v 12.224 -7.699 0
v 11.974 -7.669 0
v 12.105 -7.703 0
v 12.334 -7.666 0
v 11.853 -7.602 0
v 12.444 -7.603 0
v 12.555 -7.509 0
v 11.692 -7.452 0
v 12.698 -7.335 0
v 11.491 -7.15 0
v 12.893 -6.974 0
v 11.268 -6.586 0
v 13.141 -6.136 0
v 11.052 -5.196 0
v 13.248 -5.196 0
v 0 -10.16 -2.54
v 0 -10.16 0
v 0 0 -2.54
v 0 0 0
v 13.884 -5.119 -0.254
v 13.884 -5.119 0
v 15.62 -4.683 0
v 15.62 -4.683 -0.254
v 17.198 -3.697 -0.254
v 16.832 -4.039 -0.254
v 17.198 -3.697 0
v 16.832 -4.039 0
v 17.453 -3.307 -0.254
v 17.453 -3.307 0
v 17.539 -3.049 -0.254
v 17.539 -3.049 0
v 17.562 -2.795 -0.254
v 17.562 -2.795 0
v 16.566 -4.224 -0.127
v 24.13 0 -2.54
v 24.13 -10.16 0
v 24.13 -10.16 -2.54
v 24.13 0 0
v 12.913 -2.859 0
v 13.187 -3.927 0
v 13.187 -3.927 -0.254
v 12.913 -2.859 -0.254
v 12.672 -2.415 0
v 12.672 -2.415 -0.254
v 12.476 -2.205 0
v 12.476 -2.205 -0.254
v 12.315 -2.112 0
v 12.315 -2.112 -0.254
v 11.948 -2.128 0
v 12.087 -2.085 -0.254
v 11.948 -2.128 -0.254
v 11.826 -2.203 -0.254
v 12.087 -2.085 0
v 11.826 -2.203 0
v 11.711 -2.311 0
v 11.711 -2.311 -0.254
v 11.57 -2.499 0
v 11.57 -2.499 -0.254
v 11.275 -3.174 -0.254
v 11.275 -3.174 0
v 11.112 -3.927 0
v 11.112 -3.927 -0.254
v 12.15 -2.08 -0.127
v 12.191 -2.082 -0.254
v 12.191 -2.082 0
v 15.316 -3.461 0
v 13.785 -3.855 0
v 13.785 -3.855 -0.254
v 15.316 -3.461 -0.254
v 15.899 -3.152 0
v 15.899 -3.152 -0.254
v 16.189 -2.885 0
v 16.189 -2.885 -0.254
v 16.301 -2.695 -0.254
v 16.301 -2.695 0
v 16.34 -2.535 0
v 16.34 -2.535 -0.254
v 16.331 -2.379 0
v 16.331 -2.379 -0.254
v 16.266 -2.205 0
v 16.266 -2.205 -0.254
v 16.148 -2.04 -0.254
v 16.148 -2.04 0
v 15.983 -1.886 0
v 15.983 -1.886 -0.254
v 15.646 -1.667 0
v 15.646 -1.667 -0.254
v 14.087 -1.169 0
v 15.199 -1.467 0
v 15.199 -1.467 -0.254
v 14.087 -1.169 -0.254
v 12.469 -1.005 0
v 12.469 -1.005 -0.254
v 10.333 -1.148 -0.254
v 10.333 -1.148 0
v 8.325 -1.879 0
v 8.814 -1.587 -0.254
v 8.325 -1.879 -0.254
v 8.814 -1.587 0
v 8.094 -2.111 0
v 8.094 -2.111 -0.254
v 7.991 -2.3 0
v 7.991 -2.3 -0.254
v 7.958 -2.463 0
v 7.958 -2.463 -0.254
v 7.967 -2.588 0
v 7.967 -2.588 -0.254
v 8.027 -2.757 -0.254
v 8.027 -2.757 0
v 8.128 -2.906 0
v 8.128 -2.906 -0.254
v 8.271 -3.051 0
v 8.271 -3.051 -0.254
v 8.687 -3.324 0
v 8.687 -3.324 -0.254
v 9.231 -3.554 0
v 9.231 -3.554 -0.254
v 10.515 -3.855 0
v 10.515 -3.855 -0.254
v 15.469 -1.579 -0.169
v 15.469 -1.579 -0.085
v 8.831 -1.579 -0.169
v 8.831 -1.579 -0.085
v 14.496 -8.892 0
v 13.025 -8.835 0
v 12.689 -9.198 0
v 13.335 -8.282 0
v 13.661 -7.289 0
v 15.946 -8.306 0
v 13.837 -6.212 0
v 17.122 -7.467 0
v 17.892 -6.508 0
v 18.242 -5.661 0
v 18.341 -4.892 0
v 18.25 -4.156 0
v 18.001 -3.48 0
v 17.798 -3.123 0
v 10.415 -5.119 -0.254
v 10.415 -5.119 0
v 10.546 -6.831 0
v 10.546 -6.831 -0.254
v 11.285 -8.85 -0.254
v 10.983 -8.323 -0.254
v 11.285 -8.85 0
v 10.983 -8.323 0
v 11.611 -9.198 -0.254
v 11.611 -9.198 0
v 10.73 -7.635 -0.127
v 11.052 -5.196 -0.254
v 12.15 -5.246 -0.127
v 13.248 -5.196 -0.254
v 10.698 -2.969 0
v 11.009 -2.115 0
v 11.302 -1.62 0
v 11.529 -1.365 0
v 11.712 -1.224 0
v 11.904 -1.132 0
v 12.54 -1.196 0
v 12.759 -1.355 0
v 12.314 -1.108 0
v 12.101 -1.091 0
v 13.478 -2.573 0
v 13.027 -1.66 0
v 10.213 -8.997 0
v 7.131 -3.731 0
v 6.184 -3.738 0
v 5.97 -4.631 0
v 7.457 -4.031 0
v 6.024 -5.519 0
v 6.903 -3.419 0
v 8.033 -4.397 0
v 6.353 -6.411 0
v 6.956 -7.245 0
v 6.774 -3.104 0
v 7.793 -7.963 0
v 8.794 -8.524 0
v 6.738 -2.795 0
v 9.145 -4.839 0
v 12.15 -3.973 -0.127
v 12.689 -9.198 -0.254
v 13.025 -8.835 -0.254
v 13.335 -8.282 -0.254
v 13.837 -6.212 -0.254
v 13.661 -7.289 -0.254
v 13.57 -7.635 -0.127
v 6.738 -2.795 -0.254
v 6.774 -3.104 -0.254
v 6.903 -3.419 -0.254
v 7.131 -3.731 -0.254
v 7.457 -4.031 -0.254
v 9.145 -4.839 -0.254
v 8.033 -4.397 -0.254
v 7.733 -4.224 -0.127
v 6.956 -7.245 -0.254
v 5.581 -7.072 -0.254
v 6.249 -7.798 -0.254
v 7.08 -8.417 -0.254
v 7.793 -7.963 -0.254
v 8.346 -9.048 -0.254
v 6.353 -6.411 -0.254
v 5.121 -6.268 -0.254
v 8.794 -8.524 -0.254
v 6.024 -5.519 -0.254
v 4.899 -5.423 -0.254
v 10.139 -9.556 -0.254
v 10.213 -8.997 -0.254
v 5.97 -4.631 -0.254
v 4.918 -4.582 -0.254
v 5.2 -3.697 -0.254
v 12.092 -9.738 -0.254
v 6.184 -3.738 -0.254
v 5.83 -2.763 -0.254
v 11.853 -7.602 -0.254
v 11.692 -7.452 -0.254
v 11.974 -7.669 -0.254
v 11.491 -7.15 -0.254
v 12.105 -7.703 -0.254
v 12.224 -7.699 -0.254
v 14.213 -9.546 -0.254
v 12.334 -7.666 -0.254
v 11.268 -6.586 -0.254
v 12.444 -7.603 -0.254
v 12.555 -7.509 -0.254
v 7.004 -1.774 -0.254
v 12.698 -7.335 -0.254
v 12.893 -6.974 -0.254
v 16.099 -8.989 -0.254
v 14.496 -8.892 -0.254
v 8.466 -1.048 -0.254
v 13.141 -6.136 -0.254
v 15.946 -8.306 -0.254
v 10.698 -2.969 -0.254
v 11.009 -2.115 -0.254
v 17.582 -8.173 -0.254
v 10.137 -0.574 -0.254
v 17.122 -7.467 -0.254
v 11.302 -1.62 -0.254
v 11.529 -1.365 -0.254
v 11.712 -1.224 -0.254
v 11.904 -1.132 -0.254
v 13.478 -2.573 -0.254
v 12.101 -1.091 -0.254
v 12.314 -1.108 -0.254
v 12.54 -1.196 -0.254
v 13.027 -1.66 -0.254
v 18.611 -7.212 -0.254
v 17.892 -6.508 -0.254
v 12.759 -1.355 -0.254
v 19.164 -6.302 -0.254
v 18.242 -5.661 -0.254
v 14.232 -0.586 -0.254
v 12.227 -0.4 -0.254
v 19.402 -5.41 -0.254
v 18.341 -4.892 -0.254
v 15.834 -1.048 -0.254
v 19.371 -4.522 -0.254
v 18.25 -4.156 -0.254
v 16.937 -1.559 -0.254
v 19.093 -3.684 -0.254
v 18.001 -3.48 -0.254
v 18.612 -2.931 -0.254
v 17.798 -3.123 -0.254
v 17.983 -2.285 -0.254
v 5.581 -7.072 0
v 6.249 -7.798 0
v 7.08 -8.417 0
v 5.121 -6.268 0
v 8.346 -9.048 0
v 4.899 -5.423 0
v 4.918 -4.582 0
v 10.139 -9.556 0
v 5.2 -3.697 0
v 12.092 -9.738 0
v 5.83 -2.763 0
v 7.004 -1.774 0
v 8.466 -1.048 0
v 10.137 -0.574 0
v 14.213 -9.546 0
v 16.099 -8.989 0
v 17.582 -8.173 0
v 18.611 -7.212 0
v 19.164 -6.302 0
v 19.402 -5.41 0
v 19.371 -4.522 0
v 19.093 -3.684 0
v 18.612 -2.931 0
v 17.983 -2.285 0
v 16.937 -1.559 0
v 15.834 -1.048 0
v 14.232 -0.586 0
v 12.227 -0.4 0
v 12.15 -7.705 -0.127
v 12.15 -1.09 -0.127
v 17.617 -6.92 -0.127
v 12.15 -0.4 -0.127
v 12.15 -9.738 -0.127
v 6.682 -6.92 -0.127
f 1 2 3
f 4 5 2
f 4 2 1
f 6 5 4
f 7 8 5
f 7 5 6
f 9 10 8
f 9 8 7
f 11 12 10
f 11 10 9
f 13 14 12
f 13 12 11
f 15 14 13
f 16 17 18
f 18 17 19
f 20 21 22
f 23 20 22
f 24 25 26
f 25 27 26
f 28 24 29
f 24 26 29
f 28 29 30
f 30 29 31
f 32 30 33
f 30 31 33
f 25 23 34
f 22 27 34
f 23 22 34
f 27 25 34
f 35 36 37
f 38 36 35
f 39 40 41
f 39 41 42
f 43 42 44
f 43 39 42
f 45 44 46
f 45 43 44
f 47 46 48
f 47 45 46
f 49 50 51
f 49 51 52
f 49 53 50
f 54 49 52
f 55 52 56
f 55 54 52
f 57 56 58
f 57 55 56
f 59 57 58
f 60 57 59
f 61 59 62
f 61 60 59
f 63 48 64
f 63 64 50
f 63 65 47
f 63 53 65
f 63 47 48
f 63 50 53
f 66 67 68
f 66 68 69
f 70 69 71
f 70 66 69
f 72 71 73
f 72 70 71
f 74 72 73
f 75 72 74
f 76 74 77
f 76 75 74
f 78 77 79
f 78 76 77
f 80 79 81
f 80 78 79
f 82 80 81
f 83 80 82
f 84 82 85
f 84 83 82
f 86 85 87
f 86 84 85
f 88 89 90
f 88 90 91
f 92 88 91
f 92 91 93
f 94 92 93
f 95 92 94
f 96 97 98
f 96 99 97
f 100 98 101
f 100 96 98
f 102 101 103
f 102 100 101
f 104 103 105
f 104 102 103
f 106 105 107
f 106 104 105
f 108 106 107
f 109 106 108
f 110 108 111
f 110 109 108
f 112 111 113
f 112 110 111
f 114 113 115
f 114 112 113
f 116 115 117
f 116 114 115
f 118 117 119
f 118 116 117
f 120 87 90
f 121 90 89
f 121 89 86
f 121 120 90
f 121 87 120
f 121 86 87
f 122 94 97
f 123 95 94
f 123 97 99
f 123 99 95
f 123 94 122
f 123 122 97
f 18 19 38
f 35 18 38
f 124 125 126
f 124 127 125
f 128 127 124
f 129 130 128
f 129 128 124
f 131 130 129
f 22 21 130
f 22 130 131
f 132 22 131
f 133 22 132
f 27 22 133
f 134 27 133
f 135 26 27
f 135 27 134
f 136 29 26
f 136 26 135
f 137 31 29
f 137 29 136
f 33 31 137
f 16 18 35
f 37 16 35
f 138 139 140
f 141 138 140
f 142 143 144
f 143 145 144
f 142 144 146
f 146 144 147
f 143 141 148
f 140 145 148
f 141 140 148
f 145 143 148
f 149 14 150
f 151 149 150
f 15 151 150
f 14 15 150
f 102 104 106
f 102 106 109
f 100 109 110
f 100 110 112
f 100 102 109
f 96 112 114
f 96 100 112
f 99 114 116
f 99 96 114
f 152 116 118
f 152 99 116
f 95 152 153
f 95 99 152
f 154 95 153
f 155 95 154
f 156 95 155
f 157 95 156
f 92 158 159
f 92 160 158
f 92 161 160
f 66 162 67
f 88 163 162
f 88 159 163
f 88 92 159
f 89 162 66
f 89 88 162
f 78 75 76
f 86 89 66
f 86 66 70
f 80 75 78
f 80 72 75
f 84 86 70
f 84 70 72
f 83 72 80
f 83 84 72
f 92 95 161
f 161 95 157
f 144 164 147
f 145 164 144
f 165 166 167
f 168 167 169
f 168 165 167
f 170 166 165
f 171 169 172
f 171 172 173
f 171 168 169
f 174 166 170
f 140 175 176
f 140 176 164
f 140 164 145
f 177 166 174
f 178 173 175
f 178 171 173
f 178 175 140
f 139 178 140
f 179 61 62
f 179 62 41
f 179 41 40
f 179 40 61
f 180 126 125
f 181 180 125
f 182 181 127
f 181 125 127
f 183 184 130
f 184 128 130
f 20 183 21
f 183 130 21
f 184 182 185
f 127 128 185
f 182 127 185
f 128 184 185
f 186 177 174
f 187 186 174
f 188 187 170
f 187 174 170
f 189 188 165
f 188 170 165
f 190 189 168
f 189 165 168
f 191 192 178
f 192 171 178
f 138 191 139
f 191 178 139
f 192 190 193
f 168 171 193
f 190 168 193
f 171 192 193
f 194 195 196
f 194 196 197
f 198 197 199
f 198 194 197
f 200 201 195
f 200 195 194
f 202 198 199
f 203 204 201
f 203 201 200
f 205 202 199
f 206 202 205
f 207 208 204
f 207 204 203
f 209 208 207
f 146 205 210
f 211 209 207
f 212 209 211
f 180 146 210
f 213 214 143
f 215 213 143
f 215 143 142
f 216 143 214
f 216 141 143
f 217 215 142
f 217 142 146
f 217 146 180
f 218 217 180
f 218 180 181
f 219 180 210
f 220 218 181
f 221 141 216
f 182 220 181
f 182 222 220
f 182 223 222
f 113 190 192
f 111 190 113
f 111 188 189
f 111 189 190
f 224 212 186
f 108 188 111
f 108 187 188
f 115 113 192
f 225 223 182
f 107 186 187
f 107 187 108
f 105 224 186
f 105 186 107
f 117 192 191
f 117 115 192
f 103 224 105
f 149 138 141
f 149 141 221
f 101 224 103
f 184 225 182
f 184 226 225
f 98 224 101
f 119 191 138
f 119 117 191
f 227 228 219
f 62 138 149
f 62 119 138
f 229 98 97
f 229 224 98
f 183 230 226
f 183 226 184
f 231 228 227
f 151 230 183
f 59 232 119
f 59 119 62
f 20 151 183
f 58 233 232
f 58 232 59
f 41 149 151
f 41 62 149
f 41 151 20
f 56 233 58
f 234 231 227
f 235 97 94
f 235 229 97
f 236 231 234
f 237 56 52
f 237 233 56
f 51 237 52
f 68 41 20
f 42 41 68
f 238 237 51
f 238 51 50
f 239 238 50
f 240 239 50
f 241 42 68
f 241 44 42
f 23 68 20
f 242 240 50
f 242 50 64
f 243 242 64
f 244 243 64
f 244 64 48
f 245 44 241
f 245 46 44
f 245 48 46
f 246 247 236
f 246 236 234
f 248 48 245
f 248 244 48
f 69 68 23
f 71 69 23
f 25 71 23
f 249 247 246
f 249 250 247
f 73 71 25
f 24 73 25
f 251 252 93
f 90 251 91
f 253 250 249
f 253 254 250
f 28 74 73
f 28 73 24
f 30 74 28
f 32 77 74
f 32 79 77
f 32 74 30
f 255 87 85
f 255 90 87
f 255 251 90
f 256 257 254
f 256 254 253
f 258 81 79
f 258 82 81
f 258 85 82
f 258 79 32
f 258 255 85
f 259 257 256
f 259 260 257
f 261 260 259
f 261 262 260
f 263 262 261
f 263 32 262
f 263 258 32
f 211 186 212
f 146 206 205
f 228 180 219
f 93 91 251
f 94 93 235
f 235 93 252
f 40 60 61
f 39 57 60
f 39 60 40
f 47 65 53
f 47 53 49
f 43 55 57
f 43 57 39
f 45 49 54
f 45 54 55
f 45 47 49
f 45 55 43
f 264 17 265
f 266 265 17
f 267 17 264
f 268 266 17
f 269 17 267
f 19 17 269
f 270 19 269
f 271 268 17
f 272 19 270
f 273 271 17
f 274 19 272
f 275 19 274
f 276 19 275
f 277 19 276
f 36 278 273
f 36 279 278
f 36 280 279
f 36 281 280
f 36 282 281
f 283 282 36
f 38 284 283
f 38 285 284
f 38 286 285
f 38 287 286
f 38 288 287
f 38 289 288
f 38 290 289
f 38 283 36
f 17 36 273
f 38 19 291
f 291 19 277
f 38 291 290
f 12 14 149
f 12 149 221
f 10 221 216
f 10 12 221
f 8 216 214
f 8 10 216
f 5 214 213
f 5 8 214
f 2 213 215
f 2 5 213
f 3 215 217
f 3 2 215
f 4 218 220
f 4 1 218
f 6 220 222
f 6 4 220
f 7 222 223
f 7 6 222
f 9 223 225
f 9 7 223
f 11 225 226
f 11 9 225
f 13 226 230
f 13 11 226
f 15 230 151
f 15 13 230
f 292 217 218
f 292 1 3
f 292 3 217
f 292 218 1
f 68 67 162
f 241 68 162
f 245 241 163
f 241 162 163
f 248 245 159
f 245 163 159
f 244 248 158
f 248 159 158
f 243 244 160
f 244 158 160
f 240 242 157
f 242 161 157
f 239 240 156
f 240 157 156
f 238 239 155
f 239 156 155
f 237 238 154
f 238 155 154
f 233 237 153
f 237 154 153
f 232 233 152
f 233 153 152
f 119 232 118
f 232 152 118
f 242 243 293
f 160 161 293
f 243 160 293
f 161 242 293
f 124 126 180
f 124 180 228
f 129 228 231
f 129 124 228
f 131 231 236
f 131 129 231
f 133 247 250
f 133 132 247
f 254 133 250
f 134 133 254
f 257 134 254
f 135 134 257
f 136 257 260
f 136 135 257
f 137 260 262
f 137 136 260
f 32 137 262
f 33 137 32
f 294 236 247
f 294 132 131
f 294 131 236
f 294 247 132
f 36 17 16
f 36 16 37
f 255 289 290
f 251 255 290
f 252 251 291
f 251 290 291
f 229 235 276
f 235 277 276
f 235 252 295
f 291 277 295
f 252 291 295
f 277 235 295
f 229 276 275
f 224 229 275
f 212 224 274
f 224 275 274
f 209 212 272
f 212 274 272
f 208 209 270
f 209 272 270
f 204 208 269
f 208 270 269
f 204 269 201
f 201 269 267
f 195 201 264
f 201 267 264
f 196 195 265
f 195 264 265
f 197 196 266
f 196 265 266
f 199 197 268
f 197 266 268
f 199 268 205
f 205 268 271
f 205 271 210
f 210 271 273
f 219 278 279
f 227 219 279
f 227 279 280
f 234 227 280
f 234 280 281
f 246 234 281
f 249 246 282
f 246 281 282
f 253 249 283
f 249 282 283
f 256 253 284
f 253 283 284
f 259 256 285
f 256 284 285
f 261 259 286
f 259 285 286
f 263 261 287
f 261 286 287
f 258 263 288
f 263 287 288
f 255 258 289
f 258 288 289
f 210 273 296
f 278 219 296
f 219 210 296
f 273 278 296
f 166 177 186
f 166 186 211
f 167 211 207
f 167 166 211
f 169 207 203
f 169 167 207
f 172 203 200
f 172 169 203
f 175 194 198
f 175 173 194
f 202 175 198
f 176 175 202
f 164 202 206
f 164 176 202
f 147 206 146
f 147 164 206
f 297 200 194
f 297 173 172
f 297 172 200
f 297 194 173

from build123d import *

# Parameters (mm, degrees)
F0_W     = 24.13
F0_H     = 10.16
F2_DEPTH = 2.54
F3_DEPTH = 0.254


with BuildPart() as f2:
    # F0 (on Top) → F2 (new body)
    with BuildSketch(Plane.XY):
        with Locations((12.065, -5.08)):
            Rectangle(F0_W, F0_H)
    extrude(amount=-F2_DEPTH)

    # F1 (on Top) → F3 (cut)
    with BuildSketch(Plane.XY):
        with BuildLine():
            add(Edge.make_bspline(
                [(8.4657929971, -1.0478082096), (-14.5786610899, -9.7377153717), (12.1497893706, -9.7377153717), (38.8782398311, -9.7377153717), (15.8337857441, -1.0478082096)],
                knots=[2.102056207, 2.102056207, 2.102056207, 4.7123889804, 4.7123889804, 7.3227217538, 7.3227217538, 7.3227217538], degree=2, weights=[1, 0.2625171666, 1, 0.2625171666, 1]))
            add(Edge.make_bspline(
                [(15.8337857441, -1.0478082096), (12.1497893706, 0.3414018081), (8.4657929971, -1.0478082096)],
                knots=[1.0395364466, 1.0395364466, 1.0395364466, 2.102056207, 2.102056207, 2.102056207], degree=2, weights=[1, 0.8621694745, 1]))
        make_face()
        with BuildLine():
            add(Edge.make_bspline(
                [(6.7375296922, -2.7946639807), (6.6912513592, -4.5547321645), (10.4154872997, -5.1187276263)],
                knots=[3.1298212757, 3.1298212757, 3.1298212757, 4.3862189448, 4.3862189448, 4.3862189448], degree=2, weights=[1, 0.8090873442, 1]))
            add(Edge.make_bspline(
                [(10.4154872997, -5.1187276263), (10.3755449532, -8.2304178079), (11.6107446638, -9.197573501)],
                knots=[1.5400547916, 1.5400547916, 1.5400547916, 2.8256982249, 2.8256982249, 2.8256982249], degree=2, weights=[1, 0.8004074506, 1]))
            add(Edge.make_bspline(
                [(6.7375296922, -2.7946639807), (2.1044091607, -8.617624256), (11.6107446638, -9.197573501)],
                knots=[2.6346337174, 2.6346337174, 2.6346337174, 4.6252084144, 4.6252084144, 4.6252084144], degree=2, weights=[1, 0.5442618509, 1]))
        make_face(mode=Mode.SUBTRACT)
        with BuildLine():
            add(Edge.make_bspline(
                [(11.051641262, -5.1960937268), (11.1585612733, -7.7051730692), (12.1497893706, -7.7051730692), (13.1410174679, -7.7051730692), (13.2479374792, -5.1960937268)],
                knots=[4.820465459, 4.820465459, 4.820465459, 6.2831853072, 6.2831853072, 7.7459051554, 7.7459051554, 7.7459051554], degree=2, weights=[1, 0.7442668215, 1, 0.7442668215, 1]))
            add(Edge.make_bspline(
                [(11.051641262, -5.1960937268), (12.1497893706, -5.2979622052), (13.2479374792, -5.1960937268)],
                knots=[4.5080845994, 4.5080845994, 4.5080845994, 4.9166933613, 4.9166933613, 4.9166933613], degree=2, weights=[1, 0.9792023528, 1]))
        make_face(mode=Mode.SUBTRACT)
        with BuildLine():
            add(Edge.make_bspline(
                [(12.6888340773, -9.197573501), (13.924033788, -8.2304178079), (13.8840914415, -5.1187276263)],
                knots=[3.4574870822, 3.4574870822, 3.4574870822, 4.7431305156, 4.7431305156, 4.7431305156], degree=2, weights=[1, 0.8004074506, 1]))
            add(Edge.make_bspline(
                [(13.8840914415, -5.1187276263), (17.608327382, -4.5547321645), (17.562049049, -2.7946639807)],
                knots=[5.038559016, 5.038559016, 5.038559016, 6.2949566851, 6.2949566851, 6.2949566851], degree=2, weights=[1, 0.8090873442, 1]))
            add(Edge.make_bspline(
                [(12.6888340773, -9.197573501), (22.1951695805, -8.617624256), (17.562049049, -2.7946639807)],
                knots=[4.7995695463, 4.7995695463, 4.7995695463, 6.7901442434, 6.7901442434, 6.7901442434], degree=2, weights=[1, 0.5442618509, 1]))
        make_face(mode=Mode.SUBTRACT)
        with BuildLine():
            add(Edge.make_bspline(
                [(13.1872098156, -3.9269217463), (12.1497893706, 3.2971973652), (11.1123689256, -3.9269217463)],
                knots=[1.9213345944, 1.9213345944, 1.9213345944, 4.3618507128, 4.3618507128, 4.3618507128], degree=2, weights=[1, 0.3434033916, 1]))
            add(Edge.make_bspline(
                [(11.1123689256, -3.9269217463), (12.1497893706, -4.0208485925), (13.1872098156, -3.9269217463)],
                knots=[4.4623227822, 4.4623227822, 4.4623227822, 4.9624551786, 4.9624551786, 4.9624551786], degree=2, weights=[1, 0.9688960419, 1]))
        make_face(mode=Mode.SUBTRACT)
        with BuildLine():
            add(Edge.make_bspline(
                [(13.7848709754, -3.8554493307), (18.7878984023, -3.1042341491), (15.4688438864, -1.5793413647), (12.1497893706, -0.0544485804), (8.8307348548, -1.5793413647), (5.5116803389, -3.1042341491), (10.5147077658, -3.8554493307)],
                knots=[5.1130588482, 5.1130588482, 5.1130588482, 6.9403407054, 6.9403407054, 8.7676225626, 8.7676225626, 10.5949044198, 10.5949044198, 10.5949044198], degree=2, weights=[1, 0.6108671611, 1, 0.6108671611, 1, 0.6108671611, 1]))
            add(Edge.make_bspline(
                [(13.7848709754, -3.8554493307), (12.1497893706, 7.1748808552), (10.5147077658, -3.8554493307)],
                knots=[5.0536184378, 5.0536184378, 5.0536184378, 7.5127521766, 7.5127521766, 7.5127521766], degree=2, weights=[1, 0.3346459165, 1]))
        make_face(mode=Mode.SUBTRACT)
        with BuildLine():
            add(Edge.make_bspline(
                [(15.8337857441, -1.0478082096), (12.1497893706, 0.3414018081), (8.4657929971, -1.0478082096)],
                knots=[1.0395364466, 1.0395364466, 1.0395364466, 2.102056207, 2.102056207, 2.102056207], degree=2, weights=[1, 0.8621694745, 1]))
            add(Edge.make_bspline(
                [(15.8337857441, -1.0478082096), (12.1497893706, 0.4844966514), (8.4657929971, -1.0478082096)],
                knots=[0.8221754192, 0.8221754192, 0.8221754192, 2.3194172344, 2.3194172344, 2.3194172344], degree=2, weights=[1, 0.7326282156, 1]))
        make_face()
    extrude(amount=-F3_DEPTH, mode=Mode.SUBTRACT)


solid = f2.part
